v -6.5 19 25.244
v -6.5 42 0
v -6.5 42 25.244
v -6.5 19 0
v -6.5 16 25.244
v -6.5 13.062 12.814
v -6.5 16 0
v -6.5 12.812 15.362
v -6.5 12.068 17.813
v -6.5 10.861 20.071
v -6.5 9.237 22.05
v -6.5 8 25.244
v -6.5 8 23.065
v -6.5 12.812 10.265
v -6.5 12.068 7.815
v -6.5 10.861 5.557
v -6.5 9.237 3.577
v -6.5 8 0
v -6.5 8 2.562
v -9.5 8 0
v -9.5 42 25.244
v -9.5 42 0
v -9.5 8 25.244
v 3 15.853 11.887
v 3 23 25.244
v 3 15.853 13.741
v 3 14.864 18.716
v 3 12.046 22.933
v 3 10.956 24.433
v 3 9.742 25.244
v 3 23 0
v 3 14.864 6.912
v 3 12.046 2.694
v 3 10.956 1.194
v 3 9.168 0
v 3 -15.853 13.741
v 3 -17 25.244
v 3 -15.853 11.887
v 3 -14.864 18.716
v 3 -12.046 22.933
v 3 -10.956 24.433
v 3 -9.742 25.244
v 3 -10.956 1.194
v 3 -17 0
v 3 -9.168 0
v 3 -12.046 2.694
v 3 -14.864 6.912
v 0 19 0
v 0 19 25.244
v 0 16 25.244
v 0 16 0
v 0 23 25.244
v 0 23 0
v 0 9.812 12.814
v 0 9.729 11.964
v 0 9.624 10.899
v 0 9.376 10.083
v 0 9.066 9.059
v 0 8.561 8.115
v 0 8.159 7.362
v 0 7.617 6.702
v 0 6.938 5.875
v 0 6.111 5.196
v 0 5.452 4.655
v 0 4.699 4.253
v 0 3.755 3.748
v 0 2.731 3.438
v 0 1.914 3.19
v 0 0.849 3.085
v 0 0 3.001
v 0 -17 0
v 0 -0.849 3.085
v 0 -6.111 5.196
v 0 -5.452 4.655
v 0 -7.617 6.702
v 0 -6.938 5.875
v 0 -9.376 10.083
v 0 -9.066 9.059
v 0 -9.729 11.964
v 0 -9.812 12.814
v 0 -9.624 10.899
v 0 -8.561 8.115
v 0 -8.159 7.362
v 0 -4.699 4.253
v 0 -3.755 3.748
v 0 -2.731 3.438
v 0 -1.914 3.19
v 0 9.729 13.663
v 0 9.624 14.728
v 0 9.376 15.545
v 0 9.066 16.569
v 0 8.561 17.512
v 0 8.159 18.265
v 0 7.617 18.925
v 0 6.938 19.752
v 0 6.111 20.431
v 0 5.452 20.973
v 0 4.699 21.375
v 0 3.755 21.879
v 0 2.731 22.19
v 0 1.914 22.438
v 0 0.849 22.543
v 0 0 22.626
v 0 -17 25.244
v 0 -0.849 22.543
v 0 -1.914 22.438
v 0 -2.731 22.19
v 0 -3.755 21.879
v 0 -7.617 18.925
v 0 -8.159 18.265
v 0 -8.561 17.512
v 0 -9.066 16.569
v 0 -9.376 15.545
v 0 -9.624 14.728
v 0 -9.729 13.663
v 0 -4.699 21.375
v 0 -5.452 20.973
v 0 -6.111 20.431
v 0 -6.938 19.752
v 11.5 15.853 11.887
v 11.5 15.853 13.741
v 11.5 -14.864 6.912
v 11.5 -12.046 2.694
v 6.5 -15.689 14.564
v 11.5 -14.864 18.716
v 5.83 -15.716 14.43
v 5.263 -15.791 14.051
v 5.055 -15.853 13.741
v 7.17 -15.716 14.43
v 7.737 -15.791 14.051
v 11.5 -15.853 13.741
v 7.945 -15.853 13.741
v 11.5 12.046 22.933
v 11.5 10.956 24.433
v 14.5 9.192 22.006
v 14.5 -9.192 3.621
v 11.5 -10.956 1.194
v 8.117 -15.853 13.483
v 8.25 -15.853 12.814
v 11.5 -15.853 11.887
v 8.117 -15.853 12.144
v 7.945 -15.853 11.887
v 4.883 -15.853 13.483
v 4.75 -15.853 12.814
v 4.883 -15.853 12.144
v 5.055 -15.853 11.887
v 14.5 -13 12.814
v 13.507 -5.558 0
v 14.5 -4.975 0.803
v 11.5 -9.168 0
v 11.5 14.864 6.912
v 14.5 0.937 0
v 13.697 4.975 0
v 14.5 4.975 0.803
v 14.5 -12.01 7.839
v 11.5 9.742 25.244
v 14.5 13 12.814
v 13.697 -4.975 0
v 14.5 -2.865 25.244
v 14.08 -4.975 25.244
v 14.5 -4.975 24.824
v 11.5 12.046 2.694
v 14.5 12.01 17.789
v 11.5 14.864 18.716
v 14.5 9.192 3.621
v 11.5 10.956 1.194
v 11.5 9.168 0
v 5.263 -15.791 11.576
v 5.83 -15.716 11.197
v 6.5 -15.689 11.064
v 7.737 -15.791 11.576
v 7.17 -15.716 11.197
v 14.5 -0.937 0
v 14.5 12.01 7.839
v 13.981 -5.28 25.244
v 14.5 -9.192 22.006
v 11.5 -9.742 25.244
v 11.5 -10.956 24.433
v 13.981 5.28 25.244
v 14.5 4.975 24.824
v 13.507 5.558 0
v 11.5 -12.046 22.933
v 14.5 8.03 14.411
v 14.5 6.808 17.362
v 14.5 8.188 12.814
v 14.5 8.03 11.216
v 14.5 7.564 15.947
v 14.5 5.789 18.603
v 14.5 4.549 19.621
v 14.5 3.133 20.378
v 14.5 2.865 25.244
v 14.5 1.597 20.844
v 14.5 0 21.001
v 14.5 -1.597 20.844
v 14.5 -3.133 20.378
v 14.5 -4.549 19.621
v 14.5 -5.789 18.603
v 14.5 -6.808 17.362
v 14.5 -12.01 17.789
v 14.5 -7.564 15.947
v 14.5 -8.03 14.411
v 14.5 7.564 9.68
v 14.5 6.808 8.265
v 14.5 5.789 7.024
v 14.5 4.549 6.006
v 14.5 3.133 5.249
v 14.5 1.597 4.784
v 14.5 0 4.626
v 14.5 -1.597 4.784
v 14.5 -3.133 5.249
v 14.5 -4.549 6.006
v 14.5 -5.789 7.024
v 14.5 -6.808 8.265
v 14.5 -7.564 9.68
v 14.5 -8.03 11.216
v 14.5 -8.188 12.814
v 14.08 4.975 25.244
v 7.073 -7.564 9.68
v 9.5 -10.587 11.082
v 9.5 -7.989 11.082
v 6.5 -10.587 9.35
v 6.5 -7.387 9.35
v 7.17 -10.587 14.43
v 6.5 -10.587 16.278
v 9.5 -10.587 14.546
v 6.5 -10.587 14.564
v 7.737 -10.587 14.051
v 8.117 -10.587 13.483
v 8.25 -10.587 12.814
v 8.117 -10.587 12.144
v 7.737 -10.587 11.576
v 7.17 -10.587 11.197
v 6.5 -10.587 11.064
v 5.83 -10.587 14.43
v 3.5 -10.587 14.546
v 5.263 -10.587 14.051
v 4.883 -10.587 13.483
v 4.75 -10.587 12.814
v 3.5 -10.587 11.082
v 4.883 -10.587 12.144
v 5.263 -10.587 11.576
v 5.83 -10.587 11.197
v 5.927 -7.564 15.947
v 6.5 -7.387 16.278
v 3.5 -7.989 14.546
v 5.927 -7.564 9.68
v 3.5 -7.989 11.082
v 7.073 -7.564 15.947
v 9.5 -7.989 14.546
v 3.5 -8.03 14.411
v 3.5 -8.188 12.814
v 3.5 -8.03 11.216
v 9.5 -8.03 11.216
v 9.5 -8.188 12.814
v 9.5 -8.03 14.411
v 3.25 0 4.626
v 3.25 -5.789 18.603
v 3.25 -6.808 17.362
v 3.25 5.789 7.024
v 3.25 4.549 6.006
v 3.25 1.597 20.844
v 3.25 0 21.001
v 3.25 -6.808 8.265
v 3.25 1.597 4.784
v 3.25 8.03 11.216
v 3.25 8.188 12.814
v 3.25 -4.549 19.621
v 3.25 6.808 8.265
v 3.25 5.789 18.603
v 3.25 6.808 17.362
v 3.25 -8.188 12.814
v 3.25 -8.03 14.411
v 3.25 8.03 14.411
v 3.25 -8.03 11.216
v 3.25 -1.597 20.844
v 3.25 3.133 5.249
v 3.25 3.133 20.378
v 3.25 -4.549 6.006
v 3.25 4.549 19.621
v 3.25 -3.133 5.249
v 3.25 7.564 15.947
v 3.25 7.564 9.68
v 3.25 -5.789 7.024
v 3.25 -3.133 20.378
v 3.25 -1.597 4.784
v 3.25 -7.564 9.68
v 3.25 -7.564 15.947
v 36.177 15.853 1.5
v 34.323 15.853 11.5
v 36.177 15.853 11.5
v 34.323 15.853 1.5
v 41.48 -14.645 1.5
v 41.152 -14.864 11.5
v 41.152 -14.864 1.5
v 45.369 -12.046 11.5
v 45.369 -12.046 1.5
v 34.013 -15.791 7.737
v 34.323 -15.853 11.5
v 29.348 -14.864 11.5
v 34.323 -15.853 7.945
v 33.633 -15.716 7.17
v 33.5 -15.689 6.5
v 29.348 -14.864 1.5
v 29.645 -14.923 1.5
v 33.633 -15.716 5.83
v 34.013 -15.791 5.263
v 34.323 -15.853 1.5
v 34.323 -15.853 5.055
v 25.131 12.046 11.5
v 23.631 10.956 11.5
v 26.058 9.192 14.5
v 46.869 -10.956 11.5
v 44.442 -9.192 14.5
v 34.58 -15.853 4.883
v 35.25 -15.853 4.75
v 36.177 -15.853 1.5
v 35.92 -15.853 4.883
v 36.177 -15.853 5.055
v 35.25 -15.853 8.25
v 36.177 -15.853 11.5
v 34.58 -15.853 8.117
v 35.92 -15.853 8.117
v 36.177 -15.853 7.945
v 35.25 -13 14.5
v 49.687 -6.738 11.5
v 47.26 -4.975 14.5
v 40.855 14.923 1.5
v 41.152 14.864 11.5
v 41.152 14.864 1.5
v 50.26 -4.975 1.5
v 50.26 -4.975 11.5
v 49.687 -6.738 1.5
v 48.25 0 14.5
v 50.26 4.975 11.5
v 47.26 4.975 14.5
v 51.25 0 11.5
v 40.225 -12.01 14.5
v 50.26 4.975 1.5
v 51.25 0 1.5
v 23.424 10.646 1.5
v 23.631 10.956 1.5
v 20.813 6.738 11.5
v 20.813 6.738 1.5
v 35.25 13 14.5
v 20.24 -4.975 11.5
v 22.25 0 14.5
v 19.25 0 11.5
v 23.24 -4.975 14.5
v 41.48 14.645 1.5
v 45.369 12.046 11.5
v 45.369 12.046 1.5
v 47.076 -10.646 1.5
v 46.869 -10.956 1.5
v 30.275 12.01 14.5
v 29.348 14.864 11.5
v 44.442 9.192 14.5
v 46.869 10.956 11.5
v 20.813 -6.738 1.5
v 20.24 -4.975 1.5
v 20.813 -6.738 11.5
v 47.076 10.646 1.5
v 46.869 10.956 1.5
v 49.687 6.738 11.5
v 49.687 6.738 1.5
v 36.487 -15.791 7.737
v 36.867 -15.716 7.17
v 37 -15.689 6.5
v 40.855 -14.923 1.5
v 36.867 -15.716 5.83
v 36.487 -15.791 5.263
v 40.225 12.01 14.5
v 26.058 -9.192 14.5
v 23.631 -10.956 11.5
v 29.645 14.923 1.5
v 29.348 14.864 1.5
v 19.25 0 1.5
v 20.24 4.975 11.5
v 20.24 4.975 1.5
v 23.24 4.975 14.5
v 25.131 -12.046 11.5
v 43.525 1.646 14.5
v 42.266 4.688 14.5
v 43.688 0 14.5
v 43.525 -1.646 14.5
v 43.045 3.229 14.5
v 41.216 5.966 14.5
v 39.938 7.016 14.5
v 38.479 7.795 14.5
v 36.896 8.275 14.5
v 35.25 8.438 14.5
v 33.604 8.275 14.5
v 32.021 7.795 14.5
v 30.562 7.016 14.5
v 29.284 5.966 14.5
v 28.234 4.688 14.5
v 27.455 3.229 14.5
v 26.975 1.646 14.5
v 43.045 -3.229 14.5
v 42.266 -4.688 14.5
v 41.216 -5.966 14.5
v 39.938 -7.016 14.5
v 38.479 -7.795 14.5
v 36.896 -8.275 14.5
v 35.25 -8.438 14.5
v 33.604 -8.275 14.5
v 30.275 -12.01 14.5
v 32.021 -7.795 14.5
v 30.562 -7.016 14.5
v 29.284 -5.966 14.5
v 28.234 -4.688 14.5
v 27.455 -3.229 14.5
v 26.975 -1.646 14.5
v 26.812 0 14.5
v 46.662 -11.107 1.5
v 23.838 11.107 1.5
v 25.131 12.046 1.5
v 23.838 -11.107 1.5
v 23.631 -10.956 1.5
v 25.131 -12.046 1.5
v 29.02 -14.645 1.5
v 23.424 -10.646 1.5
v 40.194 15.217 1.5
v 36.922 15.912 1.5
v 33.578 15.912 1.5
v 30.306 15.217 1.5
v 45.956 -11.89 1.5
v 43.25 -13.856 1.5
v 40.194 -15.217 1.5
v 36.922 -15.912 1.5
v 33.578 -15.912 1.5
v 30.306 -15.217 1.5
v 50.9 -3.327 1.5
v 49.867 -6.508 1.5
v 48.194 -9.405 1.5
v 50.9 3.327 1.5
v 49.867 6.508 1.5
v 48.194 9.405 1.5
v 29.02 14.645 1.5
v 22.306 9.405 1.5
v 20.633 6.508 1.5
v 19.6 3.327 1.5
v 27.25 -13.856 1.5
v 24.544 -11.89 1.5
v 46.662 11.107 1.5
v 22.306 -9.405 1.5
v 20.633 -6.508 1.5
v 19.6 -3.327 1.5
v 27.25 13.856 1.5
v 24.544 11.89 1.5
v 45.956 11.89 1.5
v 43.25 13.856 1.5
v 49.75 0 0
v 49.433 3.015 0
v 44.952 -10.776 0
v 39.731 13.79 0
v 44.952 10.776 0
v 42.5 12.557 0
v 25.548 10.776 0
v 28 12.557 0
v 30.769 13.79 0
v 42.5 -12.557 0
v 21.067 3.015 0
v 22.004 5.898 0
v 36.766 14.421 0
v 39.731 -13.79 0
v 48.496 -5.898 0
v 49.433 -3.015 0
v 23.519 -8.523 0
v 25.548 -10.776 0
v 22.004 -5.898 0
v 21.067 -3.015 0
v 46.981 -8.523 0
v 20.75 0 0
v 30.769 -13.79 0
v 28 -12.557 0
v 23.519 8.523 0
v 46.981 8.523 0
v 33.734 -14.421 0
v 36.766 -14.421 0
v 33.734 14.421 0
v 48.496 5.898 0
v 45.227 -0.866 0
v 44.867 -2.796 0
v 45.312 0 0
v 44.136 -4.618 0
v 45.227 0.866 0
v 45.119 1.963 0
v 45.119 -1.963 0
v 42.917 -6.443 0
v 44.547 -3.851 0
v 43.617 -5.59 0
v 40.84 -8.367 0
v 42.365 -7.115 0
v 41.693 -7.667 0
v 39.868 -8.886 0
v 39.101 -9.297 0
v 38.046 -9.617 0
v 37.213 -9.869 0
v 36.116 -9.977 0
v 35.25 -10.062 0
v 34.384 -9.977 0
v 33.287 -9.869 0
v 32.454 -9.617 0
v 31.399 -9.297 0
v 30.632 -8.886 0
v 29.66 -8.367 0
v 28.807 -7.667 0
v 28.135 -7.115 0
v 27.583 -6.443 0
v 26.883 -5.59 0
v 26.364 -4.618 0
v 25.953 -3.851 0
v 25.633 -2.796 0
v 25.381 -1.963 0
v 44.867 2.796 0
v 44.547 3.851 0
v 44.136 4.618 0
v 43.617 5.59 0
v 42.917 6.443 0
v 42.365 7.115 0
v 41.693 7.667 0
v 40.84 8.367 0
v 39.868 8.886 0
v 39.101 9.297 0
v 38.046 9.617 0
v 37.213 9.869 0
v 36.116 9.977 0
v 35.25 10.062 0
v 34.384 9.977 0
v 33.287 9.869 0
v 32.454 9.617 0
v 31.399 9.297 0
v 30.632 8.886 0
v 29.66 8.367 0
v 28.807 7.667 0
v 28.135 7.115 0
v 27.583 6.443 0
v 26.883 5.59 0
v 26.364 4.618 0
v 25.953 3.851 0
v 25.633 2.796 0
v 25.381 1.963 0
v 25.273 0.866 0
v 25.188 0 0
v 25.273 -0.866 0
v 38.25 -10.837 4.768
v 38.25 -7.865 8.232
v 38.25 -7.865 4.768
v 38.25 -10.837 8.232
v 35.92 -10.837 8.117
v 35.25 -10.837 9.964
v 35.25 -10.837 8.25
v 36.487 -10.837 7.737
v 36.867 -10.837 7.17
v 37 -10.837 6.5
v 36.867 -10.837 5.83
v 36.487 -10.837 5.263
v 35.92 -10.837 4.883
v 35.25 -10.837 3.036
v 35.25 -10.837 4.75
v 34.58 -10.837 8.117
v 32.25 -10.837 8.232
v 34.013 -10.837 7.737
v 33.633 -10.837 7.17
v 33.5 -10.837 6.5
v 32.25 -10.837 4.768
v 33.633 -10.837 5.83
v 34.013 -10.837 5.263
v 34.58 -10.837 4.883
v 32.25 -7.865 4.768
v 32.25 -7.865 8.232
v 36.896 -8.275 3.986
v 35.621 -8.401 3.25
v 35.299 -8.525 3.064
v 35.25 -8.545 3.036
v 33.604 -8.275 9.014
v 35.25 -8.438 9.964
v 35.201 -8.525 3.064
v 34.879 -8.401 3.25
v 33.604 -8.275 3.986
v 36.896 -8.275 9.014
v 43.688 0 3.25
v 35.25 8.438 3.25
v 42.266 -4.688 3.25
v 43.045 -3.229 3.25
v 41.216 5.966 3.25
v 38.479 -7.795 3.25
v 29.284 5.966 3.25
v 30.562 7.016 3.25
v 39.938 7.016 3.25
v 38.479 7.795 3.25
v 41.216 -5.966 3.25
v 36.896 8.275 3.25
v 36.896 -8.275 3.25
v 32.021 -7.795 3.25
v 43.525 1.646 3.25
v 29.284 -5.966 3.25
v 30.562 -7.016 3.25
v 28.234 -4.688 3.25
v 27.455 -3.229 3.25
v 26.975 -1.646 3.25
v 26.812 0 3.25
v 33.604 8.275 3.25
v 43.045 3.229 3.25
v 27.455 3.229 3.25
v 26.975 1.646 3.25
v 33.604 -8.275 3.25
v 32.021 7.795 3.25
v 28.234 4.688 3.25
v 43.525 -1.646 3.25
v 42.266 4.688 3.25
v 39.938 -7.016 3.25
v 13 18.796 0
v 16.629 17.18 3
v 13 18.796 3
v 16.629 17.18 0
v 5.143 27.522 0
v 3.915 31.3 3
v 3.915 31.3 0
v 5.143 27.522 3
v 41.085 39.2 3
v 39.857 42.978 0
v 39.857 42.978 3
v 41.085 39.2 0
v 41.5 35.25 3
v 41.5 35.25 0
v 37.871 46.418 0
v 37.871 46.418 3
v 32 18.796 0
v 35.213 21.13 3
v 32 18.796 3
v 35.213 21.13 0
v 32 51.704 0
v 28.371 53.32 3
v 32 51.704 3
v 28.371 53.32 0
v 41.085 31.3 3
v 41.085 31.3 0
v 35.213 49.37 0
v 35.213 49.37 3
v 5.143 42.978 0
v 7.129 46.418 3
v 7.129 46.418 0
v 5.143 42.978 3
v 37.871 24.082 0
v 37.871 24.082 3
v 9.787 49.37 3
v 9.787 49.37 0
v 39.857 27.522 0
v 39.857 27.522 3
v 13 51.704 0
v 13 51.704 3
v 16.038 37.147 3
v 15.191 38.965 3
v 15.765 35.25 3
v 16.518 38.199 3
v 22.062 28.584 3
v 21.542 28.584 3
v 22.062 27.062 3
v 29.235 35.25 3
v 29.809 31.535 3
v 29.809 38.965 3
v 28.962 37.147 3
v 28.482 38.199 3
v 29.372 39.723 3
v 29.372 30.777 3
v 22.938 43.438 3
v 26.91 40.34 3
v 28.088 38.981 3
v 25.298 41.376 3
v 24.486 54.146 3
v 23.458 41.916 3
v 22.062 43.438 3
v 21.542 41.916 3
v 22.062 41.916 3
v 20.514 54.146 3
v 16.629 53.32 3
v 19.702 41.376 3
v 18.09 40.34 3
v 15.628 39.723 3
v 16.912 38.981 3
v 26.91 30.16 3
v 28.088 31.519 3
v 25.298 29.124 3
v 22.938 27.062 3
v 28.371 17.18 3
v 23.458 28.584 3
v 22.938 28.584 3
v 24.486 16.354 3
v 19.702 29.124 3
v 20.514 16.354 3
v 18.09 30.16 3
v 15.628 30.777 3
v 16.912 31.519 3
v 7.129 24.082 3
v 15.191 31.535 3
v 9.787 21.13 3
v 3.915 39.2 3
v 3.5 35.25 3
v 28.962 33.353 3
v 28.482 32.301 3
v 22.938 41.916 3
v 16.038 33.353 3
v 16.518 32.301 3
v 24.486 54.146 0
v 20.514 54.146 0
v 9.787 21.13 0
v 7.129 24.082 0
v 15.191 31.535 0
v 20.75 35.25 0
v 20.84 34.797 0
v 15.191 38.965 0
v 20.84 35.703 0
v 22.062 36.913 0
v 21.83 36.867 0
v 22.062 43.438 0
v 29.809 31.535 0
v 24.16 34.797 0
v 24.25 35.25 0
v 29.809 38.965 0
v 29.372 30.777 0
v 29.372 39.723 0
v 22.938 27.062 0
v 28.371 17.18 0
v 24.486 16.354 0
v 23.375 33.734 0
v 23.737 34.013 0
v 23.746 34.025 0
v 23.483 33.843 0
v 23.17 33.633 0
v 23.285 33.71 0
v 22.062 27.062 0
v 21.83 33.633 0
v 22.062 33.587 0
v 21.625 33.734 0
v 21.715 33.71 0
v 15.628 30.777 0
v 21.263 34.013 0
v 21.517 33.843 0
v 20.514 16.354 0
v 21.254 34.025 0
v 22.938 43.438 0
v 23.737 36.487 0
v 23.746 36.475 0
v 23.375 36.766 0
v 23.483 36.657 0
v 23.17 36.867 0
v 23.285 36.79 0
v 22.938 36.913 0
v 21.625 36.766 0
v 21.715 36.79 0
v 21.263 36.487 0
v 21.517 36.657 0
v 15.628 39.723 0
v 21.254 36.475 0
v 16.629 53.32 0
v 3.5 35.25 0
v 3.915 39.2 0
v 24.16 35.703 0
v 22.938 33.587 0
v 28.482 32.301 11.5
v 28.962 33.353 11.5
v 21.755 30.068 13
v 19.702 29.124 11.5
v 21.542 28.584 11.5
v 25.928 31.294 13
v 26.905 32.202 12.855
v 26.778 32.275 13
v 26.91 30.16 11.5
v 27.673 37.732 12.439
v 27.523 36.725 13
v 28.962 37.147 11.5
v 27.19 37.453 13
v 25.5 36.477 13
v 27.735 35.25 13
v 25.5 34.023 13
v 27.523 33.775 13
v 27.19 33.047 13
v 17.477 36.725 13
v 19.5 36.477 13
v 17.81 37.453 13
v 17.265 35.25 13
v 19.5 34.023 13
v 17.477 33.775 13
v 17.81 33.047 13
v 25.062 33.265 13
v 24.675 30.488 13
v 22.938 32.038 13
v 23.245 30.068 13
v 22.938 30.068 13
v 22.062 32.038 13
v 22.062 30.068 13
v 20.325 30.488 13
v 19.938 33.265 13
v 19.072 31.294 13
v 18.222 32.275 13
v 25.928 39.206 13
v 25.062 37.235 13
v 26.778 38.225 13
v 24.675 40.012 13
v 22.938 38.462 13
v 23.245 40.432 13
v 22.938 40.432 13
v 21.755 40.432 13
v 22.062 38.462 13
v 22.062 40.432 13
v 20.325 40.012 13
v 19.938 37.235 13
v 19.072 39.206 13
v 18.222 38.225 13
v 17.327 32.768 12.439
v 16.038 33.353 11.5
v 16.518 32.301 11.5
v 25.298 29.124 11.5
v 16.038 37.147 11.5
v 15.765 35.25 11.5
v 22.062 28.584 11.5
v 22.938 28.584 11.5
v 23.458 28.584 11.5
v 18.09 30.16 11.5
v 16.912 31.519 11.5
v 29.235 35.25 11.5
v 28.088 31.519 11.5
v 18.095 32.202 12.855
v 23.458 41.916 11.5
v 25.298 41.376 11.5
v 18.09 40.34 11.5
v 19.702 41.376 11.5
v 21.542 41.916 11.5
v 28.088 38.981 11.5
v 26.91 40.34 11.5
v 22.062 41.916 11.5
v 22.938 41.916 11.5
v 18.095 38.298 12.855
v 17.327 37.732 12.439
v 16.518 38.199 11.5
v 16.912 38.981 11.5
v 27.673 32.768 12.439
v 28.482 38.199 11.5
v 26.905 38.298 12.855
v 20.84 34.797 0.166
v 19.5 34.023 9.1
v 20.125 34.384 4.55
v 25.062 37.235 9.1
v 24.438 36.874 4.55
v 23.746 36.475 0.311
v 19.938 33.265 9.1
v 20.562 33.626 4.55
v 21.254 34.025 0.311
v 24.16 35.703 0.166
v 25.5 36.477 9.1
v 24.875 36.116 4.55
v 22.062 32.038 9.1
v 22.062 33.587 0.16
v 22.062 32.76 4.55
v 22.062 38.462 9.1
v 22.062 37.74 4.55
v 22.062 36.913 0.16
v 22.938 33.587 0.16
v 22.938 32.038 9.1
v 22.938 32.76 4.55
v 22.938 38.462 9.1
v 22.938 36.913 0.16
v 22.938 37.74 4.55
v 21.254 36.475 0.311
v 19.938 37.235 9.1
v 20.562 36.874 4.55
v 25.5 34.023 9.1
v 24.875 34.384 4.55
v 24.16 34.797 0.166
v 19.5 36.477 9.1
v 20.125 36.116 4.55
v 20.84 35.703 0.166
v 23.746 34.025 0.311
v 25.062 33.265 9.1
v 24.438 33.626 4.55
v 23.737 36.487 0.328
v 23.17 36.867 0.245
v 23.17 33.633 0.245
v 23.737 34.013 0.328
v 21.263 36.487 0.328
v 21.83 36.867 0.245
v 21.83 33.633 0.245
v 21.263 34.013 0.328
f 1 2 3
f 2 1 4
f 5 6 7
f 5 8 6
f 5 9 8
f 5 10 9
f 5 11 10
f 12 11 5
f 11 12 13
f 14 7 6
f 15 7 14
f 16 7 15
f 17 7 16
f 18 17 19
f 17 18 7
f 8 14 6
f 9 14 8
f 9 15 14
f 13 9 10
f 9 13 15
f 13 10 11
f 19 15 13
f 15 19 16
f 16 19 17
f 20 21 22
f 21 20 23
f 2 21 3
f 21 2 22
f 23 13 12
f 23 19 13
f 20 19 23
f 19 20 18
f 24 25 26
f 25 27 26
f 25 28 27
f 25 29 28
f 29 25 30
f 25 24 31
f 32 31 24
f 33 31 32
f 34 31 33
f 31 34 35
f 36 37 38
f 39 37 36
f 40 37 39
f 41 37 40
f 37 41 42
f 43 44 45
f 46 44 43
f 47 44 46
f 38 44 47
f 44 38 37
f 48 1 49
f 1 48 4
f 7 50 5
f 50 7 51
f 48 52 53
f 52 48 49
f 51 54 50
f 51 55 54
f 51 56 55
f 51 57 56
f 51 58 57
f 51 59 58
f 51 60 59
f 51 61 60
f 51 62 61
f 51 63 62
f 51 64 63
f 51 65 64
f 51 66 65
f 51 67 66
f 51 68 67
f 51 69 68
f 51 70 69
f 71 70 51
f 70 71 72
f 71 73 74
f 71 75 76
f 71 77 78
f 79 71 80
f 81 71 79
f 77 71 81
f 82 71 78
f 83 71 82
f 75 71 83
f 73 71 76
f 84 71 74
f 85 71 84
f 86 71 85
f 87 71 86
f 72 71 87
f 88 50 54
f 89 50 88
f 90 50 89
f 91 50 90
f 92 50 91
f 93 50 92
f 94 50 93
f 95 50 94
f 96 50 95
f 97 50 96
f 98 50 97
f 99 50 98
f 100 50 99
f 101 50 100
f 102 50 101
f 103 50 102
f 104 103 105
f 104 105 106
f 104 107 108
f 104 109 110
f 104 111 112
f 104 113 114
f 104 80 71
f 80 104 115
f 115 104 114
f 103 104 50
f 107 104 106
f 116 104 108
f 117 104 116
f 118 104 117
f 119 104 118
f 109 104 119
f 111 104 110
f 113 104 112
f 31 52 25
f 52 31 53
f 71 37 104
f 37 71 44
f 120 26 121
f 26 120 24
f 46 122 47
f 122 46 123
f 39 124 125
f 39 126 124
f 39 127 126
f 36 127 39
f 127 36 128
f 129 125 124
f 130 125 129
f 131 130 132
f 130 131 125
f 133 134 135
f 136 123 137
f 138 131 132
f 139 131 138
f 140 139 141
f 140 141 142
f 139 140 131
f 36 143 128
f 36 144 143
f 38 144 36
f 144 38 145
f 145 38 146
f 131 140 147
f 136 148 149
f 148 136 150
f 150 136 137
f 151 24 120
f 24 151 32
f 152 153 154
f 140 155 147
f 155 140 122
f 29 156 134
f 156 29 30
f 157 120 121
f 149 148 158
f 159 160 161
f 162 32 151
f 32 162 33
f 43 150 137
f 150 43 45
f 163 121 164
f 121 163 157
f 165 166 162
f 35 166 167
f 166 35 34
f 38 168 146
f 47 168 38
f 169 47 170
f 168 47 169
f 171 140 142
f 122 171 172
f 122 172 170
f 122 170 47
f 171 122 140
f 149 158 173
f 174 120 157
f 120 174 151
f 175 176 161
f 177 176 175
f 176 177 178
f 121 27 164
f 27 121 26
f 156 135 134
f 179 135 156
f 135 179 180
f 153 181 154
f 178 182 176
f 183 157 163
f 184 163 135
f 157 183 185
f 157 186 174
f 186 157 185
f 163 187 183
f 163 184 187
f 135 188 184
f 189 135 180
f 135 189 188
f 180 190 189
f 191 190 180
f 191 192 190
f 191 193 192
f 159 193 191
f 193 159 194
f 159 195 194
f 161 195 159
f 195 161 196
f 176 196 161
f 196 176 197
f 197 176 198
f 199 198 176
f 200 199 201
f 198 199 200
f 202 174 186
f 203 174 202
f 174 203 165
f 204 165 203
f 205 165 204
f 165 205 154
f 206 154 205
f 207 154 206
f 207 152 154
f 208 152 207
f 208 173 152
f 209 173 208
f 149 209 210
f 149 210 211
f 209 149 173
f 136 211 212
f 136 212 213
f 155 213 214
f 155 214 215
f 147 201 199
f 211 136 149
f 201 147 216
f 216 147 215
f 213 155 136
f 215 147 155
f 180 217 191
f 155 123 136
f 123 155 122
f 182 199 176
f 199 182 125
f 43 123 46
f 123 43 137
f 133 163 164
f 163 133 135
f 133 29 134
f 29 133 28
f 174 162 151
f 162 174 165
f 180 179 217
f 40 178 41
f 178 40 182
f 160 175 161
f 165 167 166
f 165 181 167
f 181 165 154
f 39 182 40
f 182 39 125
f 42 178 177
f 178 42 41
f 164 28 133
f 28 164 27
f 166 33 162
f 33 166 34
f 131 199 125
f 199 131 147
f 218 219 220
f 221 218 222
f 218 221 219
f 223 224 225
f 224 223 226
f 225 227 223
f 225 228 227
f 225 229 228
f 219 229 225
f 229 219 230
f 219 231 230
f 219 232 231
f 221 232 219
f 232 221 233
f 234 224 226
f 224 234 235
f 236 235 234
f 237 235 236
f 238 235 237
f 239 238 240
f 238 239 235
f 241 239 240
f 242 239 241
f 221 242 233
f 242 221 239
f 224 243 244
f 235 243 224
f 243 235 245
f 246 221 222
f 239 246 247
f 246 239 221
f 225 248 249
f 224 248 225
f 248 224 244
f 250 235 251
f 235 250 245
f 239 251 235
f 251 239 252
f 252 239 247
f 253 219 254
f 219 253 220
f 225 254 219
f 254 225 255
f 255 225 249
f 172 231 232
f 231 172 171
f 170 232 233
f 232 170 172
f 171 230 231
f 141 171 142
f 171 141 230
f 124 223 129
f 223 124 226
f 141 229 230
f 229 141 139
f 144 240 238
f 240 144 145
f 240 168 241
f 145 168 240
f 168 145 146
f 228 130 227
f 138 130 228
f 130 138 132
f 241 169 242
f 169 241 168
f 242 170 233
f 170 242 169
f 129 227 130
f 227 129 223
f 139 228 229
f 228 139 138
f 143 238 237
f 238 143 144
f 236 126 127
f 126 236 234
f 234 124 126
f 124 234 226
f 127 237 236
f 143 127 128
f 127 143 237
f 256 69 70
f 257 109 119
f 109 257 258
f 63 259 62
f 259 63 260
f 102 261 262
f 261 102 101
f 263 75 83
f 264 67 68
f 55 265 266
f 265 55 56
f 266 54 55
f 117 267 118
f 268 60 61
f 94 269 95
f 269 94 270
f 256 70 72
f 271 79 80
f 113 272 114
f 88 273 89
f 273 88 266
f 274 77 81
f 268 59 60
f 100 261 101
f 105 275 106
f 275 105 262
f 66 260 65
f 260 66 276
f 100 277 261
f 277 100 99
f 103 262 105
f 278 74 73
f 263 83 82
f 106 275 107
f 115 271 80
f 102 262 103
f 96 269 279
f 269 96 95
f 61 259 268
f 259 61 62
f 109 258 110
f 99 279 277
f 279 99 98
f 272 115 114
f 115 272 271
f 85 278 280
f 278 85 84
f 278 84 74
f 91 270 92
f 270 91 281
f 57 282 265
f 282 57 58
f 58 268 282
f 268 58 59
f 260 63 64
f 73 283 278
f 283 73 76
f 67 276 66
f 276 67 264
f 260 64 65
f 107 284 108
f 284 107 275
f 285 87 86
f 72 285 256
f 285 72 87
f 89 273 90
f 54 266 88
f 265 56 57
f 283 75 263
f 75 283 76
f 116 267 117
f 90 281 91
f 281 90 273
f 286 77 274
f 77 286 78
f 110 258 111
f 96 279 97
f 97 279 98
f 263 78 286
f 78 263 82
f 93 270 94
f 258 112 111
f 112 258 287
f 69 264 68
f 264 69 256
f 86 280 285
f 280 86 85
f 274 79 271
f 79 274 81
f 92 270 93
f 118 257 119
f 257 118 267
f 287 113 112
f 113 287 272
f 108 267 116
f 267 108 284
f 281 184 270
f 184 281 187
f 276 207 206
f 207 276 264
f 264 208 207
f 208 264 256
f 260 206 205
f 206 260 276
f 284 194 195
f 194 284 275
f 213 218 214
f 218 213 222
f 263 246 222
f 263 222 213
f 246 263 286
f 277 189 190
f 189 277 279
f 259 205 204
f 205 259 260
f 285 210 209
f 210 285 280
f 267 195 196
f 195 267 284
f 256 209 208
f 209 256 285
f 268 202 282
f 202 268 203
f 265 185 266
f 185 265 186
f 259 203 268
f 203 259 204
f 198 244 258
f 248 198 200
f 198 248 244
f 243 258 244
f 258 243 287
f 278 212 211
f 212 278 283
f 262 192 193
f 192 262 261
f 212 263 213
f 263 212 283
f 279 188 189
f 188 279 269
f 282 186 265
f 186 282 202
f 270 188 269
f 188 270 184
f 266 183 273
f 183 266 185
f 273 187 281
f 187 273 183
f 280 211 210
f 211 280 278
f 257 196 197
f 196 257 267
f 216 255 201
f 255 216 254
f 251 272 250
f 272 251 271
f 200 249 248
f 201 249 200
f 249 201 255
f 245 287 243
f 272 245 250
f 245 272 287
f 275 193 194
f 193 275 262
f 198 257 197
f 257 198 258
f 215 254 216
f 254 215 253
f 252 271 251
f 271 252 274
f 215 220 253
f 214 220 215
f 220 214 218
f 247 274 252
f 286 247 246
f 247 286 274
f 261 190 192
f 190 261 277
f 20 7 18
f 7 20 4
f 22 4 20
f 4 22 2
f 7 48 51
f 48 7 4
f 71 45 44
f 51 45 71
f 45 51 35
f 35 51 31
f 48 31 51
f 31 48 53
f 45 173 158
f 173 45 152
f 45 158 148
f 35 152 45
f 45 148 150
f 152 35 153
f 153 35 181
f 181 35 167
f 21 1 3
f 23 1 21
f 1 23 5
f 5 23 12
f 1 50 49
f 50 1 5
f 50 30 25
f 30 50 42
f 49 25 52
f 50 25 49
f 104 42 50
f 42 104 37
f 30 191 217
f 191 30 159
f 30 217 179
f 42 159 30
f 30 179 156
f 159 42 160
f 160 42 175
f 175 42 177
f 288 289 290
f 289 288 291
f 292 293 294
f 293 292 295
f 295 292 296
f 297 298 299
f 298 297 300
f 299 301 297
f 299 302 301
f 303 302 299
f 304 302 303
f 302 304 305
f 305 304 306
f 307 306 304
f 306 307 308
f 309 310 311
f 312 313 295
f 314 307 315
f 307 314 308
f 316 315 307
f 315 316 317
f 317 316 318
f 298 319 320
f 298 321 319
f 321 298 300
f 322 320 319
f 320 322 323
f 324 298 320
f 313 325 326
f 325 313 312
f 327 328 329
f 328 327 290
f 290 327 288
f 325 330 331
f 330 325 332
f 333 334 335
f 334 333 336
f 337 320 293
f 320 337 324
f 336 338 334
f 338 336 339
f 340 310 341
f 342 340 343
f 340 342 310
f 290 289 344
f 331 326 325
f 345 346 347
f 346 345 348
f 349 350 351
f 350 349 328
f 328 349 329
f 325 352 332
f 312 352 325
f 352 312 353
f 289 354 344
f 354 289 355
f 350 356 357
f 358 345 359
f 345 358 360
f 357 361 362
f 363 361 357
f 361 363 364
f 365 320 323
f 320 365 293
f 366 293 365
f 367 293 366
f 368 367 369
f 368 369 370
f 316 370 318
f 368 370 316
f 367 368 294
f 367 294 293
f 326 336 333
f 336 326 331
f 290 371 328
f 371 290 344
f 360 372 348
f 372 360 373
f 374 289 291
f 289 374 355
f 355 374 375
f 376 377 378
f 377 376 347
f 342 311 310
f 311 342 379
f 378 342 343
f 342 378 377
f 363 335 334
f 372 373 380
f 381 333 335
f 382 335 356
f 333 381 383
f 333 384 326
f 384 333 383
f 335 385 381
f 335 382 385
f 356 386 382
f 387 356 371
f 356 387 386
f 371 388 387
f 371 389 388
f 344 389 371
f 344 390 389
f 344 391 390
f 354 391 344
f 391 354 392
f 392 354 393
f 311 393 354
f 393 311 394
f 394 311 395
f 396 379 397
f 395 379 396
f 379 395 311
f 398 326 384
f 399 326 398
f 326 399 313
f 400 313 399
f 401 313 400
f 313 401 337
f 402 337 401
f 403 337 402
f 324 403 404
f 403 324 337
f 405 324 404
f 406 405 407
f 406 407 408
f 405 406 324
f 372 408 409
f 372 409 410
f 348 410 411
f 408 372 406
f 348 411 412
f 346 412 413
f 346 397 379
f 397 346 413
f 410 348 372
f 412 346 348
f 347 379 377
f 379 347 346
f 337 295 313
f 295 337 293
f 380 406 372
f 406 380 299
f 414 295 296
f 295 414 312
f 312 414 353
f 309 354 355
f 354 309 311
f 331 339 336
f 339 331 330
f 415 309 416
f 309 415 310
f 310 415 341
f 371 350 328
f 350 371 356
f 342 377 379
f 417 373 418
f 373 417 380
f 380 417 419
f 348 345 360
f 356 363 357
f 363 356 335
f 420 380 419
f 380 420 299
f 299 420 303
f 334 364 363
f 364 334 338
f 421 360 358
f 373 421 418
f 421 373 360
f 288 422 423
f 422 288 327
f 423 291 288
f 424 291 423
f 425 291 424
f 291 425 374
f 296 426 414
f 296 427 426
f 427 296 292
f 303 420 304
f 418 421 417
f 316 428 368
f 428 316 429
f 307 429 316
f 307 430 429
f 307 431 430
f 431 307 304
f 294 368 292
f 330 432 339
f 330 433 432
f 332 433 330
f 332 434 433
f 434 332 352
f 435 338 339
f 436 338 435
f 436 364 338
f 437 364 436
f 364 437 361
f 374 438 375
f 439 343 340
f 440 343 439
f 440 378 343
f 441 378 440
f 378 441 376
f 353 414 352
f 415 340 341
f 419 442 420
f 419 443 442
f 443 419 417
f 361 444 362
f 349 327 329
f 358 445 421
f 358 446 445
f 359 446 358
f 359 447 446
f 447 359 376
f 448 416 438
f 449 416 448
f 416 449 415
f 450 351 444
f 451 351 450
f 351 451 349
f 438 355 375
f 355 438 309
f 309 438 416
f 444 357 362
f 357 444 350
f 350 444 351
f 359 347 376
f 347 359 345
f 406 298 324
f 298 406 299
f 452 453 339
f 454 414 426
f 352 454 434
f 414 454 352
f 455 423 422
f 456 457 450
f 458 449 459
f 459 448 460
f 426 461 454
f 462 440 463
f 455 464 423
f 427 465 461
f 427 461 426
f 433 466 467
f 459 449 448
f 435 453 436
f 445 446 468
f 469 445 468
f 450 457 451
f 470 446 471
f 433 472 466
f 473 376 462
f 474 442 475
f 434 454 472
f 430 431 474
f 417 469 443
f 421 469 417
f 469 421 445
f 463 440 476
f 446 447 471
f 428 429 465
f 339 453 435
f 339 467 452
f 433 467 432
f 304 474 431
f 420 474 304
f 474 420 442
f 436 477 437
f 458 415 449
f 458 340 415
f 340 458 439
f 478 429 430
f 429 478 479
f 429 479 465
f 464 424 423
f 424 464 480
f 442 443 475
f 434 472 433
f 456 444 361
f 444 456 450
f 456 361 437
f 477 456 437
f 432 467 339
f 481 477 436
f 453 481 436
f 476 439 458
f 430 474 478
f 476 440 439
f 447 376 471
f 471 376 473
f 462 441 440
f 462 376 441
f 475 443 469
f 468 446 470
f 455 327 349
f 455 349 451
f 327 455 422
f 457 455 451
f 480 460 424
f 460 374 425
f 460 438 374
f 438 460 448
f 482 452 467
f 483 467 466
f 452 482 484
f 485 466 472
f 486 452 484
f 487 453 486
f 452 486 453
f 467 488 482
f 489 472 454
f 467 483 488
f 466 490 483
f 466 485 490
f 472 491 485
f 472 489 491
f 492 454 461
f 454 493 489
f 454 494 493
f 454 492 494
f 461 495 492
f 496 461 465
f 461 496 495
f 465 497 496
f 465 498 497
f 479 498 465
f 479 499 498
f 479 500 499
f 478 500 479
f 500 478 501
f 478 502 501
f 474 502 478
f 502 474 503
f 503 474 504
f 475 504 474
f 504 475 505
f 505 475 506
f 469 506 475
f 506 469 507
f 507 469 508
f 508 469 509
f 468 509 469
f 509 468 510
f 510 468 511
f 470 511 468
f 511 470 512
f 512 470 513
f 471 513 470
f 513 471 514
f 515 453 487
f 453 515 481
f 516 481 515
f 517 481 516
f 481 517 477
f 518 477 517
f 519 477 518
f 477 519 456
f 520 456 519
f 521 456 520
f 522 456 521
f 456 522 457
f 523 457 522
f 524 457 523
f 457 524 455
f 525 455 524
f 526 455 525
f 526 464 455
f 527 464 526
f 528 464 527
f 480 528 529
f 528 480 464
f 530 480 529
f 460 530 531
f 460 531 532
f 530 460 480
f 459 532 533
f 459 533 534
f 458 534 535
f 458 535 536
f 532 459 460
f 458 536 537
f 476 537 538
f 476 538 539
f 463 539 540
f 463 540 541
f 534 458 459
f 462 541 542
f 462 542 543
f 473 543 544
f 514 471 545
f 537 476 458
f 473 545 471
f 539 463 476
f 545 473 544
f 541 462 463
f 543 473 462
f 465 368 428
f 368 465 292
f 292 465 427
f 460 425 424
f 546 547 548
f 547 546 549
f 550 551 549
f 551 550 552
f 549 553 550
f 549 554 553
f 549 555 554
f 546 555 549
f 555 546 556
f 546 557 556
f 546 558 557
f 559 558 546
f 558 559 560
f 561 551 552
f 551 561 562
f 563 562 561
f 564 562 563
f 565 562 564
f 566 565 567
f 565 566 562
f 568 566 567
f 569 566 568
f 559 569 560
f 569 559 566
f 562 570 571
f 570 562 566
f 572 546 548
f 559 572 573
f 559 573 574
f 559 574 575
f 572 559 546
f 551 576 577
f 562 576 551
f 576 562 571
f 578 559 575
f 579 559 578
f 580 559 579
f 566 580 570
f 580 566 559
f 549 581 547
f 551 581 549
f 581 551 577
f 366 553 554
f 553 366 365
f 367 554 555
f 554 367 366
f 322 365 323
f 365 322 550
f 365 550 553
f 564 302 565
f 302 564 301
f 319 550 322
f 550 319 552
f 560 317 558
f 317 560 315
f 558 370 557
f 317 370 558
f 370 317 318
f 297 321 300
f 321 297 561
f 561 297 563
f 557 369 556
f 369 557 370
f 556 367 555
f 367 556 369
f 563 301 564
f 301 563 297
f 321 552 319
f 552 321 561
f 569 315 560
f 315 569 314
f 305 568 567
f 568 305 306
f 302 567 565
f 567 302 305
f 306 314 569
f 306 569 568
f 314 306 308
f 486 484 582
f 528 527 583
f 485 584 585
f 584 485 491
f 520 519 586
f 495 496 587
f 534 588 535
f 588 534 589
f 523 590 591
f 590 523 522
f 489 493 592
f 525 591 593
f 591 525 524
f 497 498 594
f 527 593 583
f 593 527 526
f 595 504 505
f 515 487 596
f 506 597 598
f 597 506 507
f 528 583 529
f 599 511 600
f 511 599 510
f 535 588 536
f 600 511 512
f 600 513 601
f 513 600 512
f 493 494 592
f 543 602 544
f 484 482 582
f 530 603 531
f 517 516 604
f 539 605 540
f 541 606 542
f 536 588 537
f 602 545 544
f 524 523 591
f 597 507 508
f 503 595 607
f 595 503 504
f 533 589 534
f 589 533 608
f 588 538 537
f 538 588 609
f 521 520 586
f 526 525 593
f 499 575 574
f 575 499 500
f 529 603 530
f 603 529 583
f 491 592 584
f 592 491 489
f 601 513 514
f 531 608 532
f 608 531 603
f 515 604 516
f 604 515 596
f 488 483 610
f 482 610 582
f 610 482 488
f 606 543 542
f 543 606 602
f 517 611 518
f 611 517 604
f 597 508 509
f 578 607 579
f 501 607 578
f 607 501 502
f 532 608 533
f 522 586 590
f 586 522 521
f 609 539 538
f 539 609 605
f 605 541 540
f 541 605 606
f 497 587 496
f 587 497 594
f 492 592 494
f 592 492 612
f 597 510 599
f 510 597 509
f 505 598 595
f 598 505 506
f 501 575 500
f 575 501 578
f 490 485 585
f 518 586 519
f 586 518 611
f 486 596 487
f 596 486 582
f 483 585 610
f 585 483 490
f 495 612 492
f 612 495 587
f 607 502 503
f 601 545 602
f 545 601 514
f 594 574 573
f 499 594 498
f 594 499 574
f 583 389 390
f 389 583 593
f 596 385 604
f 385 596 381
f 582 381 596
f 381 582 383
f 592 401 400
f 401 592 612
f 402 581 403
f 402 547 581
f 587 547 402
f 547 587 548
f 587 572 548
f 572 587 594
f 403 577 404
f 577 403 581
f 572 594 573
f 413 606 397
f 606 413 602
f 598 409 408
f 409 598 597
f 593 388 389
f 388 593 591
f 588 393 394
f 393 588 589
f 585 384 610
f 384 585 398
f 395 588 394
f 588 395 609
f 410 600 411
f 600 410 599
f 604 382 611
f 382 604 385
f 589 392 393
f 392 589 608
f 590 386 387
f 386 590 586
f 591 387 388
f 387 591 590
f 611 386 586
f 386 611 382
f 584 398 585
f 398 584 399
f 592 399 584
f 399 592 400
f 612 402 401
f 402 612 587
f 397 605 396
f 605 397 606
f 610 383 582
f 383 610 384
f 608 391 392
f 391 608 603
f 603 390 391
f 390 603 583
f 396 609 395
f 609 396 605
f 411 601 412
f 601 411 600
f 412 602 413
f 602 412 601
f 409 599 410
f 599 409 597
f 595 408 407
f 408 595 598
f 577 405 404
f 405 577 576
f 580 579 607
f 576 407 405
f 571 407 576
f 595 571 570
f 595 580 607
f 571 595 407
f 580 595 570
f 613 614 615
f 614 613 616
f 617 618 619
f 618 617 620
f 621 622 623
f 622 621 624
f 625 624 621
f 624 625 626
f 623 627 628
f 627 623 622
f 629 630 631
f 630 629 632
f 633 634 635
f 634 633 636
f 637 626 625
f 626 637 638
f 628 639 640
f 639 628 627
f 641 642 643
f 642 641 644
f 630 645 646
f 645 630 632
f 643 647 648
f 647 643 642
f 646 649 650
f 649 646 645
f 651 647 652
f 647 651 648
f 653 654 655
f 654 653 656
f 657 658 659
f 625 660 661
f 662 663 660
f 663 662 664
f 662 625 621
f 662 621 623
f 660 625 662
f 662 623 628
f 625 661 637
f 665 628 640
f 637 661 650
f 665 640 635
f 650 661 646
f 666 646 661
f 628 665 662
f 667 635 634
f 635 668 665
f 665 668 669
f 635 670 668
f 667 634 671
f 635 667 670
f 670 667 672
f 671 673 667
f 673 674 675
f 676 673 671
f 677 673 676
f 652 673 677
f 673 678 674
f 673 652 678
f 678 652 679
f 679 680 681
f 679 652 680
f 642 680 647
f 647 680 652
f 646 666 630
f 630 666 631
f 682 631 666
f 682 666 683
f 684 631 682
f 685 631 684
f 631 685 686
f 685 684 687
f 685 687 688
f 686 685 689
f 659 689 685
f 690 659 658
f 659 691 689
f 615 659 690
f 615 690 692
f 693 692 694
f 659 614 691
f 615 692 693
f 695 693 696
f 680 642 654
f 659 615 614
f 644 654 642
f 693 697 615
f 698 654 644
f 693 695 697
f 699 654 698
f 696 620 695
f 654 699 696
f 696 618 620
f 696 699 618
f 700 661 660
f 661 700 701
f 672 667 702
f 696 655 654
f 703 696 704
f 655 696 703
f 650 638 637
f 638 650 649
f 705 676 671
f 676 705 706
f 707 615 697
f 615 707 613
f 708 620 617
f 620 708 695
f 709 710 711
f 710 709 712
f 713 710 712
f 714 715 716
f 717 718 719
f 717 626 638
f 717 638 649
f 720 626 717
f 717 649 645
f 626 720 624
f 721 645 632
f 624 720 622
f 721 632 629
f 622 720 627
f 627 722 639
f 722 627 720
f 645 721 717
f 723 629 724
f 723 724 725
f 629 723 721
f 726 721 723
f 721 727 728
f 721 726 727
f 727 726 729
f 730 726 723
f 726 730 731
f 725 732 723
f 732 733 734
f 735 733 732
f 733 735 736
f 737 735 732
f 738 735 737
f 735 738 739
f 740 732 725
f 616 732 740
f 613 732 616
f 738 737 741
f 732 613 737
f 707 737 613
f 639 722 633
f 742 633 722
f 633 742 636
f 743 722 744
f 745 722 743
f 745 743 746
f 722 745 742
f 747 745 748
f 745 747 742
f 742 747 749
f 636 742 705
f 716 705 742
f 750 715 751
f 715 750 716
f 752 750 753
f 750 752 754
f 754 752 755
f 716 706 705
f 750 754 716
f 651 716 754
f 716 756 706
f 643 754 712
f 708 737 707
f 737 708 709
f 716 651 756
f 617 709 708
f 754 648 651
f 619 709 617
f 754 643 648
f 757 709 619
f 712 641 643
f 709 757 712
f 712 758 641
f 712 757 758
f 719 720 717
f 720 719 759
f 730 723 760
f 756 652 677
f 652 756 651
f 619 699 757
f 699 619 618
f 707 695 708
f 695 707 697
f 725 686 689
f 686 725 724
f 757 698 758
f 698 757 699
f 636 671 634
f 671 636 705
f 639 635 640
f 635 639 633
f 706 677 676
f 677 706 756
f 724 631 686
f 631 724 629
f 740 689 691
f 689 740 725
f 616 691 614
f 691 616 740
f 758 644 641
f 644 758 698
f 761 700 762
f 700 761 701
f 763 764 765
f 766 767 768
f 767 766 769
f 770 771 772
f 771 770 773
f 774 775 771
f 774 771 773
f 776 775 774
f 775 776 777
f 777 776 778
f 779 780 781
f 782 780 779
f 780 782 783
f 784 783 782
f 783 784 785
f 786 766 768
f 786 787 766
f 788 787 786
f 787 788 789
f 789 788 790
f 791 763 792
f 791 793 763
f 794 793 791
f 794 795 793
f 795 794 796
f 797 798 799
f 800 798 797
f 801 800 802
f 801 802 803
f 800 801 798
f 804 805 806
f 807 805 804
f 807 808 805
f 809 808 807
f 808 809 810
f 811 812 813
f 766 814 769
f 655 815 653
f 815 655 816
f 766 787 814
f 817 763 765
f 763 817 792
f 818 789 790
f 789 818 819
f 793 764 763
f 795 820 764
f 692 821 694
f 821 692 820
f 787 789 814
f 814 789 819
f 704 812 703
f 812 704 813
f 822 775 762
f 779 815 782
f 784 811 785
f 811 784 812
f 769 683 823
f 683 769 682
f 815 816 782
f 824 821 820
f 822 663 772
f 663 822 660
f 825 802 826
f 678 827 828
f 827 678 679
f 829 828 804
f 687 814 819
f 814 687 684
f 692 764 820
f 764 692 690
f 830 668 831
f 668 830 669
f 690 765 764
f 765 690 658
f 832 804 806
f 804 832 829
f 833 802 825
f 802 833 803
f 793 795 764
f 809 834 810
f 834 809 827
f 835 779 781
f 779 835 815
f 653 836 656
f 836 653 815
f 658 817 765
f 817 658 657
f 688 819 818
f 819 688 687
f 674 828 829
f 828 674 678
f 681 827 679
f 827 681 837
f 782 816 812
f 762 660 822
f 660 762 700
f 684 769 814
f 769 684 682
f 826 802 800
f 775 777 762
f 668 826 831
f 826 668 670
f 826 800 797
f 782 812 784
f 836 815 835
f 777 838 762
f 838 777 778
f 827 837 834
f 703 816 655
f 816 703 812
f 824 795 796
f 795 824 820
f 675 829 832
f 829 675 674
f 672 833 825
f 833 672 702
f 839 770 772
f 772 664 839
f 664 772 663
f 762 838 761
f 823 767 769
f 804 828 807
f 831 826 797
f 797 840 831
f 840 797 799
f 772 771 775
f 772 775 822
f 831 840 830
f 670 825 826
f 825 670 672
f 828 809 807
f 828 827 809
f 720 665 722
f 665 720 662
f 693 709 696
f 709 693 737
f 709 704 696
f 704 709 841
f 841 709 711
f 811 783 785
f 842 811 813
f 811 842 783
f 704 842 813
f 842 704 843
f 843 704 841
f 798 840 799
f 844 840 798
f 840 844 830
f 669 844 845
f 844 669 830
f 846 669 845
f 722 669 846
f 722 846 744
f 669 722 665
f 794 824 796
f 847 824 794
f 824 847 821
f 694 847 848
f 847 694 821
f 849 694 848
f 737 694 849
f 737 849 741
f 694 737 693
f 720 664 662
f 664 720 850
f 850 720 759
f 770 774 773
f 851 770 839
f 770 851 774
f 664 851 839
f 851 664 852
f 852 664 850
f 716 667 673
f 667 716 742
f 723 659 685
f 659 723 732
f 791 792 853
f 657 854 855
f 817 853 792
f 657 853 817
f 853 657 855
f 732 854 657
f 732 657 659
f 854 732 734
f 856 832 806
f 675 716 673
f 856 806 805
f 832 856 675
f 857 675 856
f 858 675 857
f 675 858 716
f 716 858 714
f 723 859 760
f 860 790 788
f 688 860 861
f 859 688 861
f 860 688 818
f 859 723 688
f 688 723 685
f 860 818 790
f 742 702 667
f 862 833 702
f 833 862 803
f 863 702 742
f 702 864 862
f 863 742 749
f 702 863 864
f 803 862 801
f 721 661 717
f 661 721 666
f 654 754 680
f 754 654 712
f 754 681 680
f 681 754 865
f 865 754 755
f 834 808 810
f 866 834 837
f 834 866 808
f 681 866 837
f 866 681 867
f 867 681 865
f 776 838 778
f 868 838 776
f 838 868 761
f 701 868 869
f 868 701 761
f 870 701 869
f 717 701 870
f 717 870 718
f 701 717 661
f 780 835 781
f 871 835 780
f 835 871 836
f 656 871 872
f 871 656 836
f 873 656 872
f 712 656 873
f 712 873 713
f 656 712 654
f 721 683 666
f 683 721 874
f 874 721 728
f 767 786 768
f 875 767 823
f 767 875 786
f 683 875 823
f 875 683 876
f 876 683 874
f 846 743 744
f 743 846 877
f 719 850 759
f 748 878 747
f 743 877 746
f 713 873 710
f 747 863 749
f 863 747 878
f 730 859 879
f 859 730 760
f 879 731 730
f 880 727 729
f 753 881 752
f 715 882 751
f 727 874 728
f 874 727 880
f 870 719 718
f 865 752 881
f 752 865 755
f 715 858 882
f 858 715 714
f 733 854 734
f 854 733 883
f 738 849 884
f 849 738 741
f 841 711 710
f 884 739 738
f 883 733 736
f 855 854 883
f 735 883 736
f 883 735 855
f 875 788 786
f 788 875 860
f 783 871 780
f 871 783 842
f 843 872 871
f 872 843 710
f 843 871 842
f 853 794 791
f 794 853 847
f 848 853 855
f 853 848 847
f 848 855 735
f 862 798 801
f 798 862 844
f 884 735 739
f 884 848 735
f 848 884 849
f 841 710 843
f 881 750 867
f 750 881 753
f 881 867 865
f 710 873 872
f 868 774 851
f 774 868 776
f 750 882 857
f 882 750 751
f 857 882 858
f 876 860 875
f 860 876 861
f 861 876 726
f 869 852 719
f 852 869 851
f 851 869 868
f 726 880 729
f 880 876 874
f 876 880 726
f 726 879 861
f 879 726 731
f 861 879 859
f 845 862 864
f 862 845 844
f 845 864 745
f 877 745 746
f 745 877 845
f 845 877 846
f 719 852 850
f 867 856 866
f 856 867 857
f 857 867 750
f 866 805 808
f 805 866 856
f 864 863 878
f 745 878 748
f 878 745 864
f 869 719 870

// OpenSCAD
// Parametric Spool Holder for back of Replicator.

render_part=0; // all parts
//render_part=1; // spool_holder()
//render_part=2; // spool_holder_cap()
//render_part=3; // spool_holder_insert()
//render_part=4; // spool holder cap and insert

dim_delta=0.5;
rep_panel_th=6.0+dim_delta;
rep_spool_bracket_w=33.0;
rep_spool_bracket_h=34.0;
rep_spool_bracket_offset=8.0;
rep_spool_bracket_th=3.0;
rep_support_tube_d=25.4*5/8+dim_delta; // 5/8" copper pipe
rep_support_tube_id=25.4*0.55; // inner diameter of copper pipe

spool_id=32.0;
spool_h=92.0;
bearing_od=22.5;
bearing_id=8.0;
bearing_th=7.0;

module spool_holder(panel_th=rep_panel_th,spool_bracket_w=rep_spool_bracket_w,spool_bracket_h=rep_spool_bracket_h
	, spool_bracket_offset=rep_spool_bracket_offset,spool_bracket_th=rep_spool_bracket_th, support_tube_d=rep_support_tube_d
	, spool_id=spool_id, spool_h=spool_h, bearing_od=bearing_od, bearing_id=bearing_id, bearing_th=bearing_th
	, set_screw_d=3.0+dim_delta, set_screw_nut_w=5.5+dim_delta, set_screw_nut_h=2.4
	) {
  difference() {
    union() {
      translate([-spool_bracket_w/2,spool_id/2-spool_bracket_offset,-panel_th-spool_bracket_th]) cube([spool_bracket_w,spool_bracket_h,spool_bracket_th],center=false);
      translate([-spool_bracket_w/2,spool_id/2,-panel_th-spool_bracket_th])
	  cube([spool_bracket_w,spool_bracket_th,panel_th+2*spool_bracket_th],center=false);
      translate([-spool_bracket_w/2,-spool_bracket_h/2,0]) cube([spool_bracket_w,spool_bracket_h+2*spool_bracket_th,spool_bracket_th],center=false);
      minkowski() {
	  translate([0,0,spool_bracket_th])  cylinder($fn=16,r=spool_id/2-spool_bracket_th,h=bearing_th+spool_bracket_th,center=false);
	  // sphere($fn=9,r=spool_bracket_th);
	  cylinder(r1=spool_bracket_th,r2=0,h=spool_bracket_th,center=true);
      }
    }
    translate([0,0,-panel_th]) {
      cylinder($fn=32,r1=support_tube_d/2+0.75*panel_th,r2=support_tube_d/2,h=1.5*panel_th,center=false);
      cylinder($fn=32,r=support_tube_d/2,h=spool_bracket_th+3*bearing_th,center=false);
	// set screw
	translate([0,0,panel_th+bearing_th/2+spool_bracket_th]) rotate([90,0,0]) {
	  cylinder($fn=16,r=set_screw_d/2,h=spool_id/2+spool_bracket_th,center=false);
	  translate([0,0,support_tube_d/2]) rotate([0,0,30]) intersection() {
		cube([set_screw_nut_w,2*set_screw_nut_w,2*set_screw_nut_h],center=true);
		rotate([0,0,120]) cube([set_screw_nut_w,2*set_screw_nut_w,2*set_screw_nut_h],center=true);
		rotate([0,0,240]) cube([set_screw_nut_w,2*set_screw_nut_w,2*set_screw_nut_h],center=true);
	  }
	}
    }
  }
}

module spool_holder_cap(panel_th=rep_panel_th,spool_bracket_w=rep_spool_bracket_w,spool_bracket_h=rep_spool_bracket_h
	, spool_bracket_offset=rep_spool_bracket_offset,spool_bracket_th=rep_spool_bracket_th, support_tube_d=rep_support_tube_d+dim_delta
	, spool_id=spool_id, spool_h=spool_h, bearing_od=bearing_od, bearing_id=bearing_id, bearing_th=bearing_th
	, set_screw_d=3.0+dim_delta, set_screw_nut_w=5.5+dim_delta, set_screw_nut_h=2.4
	) {
  difference() {
    union() {
	minkowski() {
      translate([0,0,spool_bracket_th])  cylinder($fn=16,r=spool_id/2-spool_bracket_th,h=bearing_th+spool_bracket_th,center=false);
	  // sphere($fn=9,r=spool_bracket_th);
	  cylinder(r1=spool_bracket_th,r2=0,h=spool_bracket_th,center=true);
	}
	cylinder(r1=spool_id/2-spool_bracket_th/2,r2=spool_id/2,h=spool_bracket_th/2,center=false);
    }
    translate([0,0,-panel_th]) {
      cylinder($fn=32,r1=support_tube_d/2+0.75*panel_th,r2=support_tube_d/2,h=1.5*panel_th,center=false);
      cylinder($fn=32,r=support_tube_d/2,h=spool_bracket_th+3*bearing_th,center=false);
	// set screw
	translate([0,0,panel_th+bearing_th/2+spool_bracket_th]) rotate([90,0,0]) {
	  cylinder($fn=16,r=set_screw_d/2,h=spool_id/2+spool_bracket_th,center=false);
	  translate([0,0,support_tube_d/2]) intersection() {
		cube([set_screw_nut_w,2*set_screw_nut_w,2*set_screw_nut_h],center=true);
		rotate([0,0,120]) cube([set_screw_nut_w,2*set_screw_nut_w,2*set_screw_nut_h],center=true);
		rotate([0,0,240]) cube([set_screw_nut_w,2*set_screw_nut_w,2*set_screw_nut_h],center=true);
	  }
	}
    }
  }
}

module spool_holder_insert(panel_th=rep_panel_th,spool_bracket_w=rep_spool_bracket_w,spool_bracket_h=rep_spool_bracket_h
	, spool_bracket_offset=rep_spool_bracket_offset,spool_bracket_th=rep_spool_bracket_th, support_tube_d=rep_support_tube_d, support_tube_id=rep_support_tube_id-dim_delta
	, spool_id=spool_id, spool_h=spool_h, bearing_od=bearing_od, bearing_id=bearing_id, bearing_th=bearing_th
	, set_screw_d=3.0+dim_delta, set_screw_nut_w=5.5+dim_delta, set_screw_nut_h=2.4
	) {
  difference() {
    union() {
	cylinder(r=spool_id/2+spool_bracket_th,h=spool_bracket_th,center=false);
	hull() {
	  cylinder(r=support_tube_id/2,h=spool_bracket_th,center=false);
	  translate([0,0,bearing_th+1.5*spool_bracket_th]) cylinder(r1=support_tube_id/2,r2=support_tube_id/2-spool_bracket_th/2,h=spool_bracket_th/2,center=false);
	}
    }
    cylinder($fn=16,r=set_screw_d/2,h=2*(bearing_th+4*spool_bracket_th),center=true);
    hull() {
	cylinder($fn=12,r=set_screw_d/2,h=spool_bracket_th/2,center=false);
	translate([0,0,bearing_th+1.5*spool_bracket_th]) intersection() {
		cube([set_screw_nut_w,2*set_screw_nut_w,2*set_screw_nut_h],center=true);
		rotate([0,0,120]) cube([set_screw_nut_w,2*set_screw_nut_w,2*set_screw_nut_h],center=true);
		rotate([0,0,240]) cube([set_screw_nut_w,2*set_screw_nut_w,2*set_screw_nut_h],center=true);
	}
    }
    rotate([0,0,30]) {
	cube(size=[support_tube_d,set_screw_d/4,2*(bearing_th+3*spool_bracket_th)],center=true);
	rotate([0,0,60]) cube(size=[support_tube_d,set_screw_d/4,2*(bearing_th+3*spool_bracket_th)],center=true);
	rotate([0,0,-60]) cube(size=[support_tube_d,set_screw_d/4,2*(bearing_th+3*spool_bracket_th)],center=true);
    }
  }
}


if(render_part==0) {
 echo("Rendering all parts...");
 difference() {
  translate([0,0,0.5*spool_id/sqrt(2)+rep_spool_bracket_th/2]) rotate([0,90,0]) spool_holder();
  translate([0,0,-spool_id/2]) cube([2*(rep_spool_bracket_w+bearing_od),2*(rep_spool_bracket_h+bearing_od),spool_id],center=true);
  translate([0,0,0.5*spool_id/sqrt(2)+rep_spool_bracket_th/2+spool_id/2+rep_support_tube_d/2+sqrt(2)*rep_spool_bracket_th]) cube([2*(rep_spool_bracket_w+bearing_od),2*(rep_spool_bracket_h+bearing_od),spool_id],center=true);
 }
 translate([spool_id+rep_panel_th/2,0,0]) spool_holder_cap();
 translate([spool_id/2+rep_panel_th,spool_id+rep_panel_th/2,0]) spool_holder_insert();
}

if(render_part==1) {
 echo("Rendering printable spool_holder()...");
 difference() {
  translate([0,0,0.5*spool_id/sqrt(2)+rep_spool_bracket_th/2]) rotate([0,90,0]) spool_holder();
  translate([0,0,-spool_id/2]) cube([2*(rep_spool_bracket_w+bearing_od),2*(rep_spool_bracket_h+bearing_od),spool_id],center=true);
  translate([0,0,0.5*spool_id/sqrt(2)+rep_spool_bracket_th/2+spool_id/2+rep_support_tube_d/2+sqrt(2)*rep_spool_bracket_th]) cube([2*(rep_spool_bracket_w+bearing_od),2*(rep_spool_bracket_h+bearing_od),spool_id],center=true);
 }
}

if(render_part==2) {
  echo("Rendering spool_holder_cap()...");
  spool_holder_cap();
}

if(render_part==3) {
  echo("Rendering spool_holder_insert()...");
  spool_holder_insert();
}

if(render_part==4) {
  echo("Rendering spool holder cap and insert...");
  translate([-(spool_id+rep_panel_th)/2,0,0]) spool_holder_cap();
  translate([(spool_id+rep_panel_th)/2,0,0]) spool_holder_insert();
}
